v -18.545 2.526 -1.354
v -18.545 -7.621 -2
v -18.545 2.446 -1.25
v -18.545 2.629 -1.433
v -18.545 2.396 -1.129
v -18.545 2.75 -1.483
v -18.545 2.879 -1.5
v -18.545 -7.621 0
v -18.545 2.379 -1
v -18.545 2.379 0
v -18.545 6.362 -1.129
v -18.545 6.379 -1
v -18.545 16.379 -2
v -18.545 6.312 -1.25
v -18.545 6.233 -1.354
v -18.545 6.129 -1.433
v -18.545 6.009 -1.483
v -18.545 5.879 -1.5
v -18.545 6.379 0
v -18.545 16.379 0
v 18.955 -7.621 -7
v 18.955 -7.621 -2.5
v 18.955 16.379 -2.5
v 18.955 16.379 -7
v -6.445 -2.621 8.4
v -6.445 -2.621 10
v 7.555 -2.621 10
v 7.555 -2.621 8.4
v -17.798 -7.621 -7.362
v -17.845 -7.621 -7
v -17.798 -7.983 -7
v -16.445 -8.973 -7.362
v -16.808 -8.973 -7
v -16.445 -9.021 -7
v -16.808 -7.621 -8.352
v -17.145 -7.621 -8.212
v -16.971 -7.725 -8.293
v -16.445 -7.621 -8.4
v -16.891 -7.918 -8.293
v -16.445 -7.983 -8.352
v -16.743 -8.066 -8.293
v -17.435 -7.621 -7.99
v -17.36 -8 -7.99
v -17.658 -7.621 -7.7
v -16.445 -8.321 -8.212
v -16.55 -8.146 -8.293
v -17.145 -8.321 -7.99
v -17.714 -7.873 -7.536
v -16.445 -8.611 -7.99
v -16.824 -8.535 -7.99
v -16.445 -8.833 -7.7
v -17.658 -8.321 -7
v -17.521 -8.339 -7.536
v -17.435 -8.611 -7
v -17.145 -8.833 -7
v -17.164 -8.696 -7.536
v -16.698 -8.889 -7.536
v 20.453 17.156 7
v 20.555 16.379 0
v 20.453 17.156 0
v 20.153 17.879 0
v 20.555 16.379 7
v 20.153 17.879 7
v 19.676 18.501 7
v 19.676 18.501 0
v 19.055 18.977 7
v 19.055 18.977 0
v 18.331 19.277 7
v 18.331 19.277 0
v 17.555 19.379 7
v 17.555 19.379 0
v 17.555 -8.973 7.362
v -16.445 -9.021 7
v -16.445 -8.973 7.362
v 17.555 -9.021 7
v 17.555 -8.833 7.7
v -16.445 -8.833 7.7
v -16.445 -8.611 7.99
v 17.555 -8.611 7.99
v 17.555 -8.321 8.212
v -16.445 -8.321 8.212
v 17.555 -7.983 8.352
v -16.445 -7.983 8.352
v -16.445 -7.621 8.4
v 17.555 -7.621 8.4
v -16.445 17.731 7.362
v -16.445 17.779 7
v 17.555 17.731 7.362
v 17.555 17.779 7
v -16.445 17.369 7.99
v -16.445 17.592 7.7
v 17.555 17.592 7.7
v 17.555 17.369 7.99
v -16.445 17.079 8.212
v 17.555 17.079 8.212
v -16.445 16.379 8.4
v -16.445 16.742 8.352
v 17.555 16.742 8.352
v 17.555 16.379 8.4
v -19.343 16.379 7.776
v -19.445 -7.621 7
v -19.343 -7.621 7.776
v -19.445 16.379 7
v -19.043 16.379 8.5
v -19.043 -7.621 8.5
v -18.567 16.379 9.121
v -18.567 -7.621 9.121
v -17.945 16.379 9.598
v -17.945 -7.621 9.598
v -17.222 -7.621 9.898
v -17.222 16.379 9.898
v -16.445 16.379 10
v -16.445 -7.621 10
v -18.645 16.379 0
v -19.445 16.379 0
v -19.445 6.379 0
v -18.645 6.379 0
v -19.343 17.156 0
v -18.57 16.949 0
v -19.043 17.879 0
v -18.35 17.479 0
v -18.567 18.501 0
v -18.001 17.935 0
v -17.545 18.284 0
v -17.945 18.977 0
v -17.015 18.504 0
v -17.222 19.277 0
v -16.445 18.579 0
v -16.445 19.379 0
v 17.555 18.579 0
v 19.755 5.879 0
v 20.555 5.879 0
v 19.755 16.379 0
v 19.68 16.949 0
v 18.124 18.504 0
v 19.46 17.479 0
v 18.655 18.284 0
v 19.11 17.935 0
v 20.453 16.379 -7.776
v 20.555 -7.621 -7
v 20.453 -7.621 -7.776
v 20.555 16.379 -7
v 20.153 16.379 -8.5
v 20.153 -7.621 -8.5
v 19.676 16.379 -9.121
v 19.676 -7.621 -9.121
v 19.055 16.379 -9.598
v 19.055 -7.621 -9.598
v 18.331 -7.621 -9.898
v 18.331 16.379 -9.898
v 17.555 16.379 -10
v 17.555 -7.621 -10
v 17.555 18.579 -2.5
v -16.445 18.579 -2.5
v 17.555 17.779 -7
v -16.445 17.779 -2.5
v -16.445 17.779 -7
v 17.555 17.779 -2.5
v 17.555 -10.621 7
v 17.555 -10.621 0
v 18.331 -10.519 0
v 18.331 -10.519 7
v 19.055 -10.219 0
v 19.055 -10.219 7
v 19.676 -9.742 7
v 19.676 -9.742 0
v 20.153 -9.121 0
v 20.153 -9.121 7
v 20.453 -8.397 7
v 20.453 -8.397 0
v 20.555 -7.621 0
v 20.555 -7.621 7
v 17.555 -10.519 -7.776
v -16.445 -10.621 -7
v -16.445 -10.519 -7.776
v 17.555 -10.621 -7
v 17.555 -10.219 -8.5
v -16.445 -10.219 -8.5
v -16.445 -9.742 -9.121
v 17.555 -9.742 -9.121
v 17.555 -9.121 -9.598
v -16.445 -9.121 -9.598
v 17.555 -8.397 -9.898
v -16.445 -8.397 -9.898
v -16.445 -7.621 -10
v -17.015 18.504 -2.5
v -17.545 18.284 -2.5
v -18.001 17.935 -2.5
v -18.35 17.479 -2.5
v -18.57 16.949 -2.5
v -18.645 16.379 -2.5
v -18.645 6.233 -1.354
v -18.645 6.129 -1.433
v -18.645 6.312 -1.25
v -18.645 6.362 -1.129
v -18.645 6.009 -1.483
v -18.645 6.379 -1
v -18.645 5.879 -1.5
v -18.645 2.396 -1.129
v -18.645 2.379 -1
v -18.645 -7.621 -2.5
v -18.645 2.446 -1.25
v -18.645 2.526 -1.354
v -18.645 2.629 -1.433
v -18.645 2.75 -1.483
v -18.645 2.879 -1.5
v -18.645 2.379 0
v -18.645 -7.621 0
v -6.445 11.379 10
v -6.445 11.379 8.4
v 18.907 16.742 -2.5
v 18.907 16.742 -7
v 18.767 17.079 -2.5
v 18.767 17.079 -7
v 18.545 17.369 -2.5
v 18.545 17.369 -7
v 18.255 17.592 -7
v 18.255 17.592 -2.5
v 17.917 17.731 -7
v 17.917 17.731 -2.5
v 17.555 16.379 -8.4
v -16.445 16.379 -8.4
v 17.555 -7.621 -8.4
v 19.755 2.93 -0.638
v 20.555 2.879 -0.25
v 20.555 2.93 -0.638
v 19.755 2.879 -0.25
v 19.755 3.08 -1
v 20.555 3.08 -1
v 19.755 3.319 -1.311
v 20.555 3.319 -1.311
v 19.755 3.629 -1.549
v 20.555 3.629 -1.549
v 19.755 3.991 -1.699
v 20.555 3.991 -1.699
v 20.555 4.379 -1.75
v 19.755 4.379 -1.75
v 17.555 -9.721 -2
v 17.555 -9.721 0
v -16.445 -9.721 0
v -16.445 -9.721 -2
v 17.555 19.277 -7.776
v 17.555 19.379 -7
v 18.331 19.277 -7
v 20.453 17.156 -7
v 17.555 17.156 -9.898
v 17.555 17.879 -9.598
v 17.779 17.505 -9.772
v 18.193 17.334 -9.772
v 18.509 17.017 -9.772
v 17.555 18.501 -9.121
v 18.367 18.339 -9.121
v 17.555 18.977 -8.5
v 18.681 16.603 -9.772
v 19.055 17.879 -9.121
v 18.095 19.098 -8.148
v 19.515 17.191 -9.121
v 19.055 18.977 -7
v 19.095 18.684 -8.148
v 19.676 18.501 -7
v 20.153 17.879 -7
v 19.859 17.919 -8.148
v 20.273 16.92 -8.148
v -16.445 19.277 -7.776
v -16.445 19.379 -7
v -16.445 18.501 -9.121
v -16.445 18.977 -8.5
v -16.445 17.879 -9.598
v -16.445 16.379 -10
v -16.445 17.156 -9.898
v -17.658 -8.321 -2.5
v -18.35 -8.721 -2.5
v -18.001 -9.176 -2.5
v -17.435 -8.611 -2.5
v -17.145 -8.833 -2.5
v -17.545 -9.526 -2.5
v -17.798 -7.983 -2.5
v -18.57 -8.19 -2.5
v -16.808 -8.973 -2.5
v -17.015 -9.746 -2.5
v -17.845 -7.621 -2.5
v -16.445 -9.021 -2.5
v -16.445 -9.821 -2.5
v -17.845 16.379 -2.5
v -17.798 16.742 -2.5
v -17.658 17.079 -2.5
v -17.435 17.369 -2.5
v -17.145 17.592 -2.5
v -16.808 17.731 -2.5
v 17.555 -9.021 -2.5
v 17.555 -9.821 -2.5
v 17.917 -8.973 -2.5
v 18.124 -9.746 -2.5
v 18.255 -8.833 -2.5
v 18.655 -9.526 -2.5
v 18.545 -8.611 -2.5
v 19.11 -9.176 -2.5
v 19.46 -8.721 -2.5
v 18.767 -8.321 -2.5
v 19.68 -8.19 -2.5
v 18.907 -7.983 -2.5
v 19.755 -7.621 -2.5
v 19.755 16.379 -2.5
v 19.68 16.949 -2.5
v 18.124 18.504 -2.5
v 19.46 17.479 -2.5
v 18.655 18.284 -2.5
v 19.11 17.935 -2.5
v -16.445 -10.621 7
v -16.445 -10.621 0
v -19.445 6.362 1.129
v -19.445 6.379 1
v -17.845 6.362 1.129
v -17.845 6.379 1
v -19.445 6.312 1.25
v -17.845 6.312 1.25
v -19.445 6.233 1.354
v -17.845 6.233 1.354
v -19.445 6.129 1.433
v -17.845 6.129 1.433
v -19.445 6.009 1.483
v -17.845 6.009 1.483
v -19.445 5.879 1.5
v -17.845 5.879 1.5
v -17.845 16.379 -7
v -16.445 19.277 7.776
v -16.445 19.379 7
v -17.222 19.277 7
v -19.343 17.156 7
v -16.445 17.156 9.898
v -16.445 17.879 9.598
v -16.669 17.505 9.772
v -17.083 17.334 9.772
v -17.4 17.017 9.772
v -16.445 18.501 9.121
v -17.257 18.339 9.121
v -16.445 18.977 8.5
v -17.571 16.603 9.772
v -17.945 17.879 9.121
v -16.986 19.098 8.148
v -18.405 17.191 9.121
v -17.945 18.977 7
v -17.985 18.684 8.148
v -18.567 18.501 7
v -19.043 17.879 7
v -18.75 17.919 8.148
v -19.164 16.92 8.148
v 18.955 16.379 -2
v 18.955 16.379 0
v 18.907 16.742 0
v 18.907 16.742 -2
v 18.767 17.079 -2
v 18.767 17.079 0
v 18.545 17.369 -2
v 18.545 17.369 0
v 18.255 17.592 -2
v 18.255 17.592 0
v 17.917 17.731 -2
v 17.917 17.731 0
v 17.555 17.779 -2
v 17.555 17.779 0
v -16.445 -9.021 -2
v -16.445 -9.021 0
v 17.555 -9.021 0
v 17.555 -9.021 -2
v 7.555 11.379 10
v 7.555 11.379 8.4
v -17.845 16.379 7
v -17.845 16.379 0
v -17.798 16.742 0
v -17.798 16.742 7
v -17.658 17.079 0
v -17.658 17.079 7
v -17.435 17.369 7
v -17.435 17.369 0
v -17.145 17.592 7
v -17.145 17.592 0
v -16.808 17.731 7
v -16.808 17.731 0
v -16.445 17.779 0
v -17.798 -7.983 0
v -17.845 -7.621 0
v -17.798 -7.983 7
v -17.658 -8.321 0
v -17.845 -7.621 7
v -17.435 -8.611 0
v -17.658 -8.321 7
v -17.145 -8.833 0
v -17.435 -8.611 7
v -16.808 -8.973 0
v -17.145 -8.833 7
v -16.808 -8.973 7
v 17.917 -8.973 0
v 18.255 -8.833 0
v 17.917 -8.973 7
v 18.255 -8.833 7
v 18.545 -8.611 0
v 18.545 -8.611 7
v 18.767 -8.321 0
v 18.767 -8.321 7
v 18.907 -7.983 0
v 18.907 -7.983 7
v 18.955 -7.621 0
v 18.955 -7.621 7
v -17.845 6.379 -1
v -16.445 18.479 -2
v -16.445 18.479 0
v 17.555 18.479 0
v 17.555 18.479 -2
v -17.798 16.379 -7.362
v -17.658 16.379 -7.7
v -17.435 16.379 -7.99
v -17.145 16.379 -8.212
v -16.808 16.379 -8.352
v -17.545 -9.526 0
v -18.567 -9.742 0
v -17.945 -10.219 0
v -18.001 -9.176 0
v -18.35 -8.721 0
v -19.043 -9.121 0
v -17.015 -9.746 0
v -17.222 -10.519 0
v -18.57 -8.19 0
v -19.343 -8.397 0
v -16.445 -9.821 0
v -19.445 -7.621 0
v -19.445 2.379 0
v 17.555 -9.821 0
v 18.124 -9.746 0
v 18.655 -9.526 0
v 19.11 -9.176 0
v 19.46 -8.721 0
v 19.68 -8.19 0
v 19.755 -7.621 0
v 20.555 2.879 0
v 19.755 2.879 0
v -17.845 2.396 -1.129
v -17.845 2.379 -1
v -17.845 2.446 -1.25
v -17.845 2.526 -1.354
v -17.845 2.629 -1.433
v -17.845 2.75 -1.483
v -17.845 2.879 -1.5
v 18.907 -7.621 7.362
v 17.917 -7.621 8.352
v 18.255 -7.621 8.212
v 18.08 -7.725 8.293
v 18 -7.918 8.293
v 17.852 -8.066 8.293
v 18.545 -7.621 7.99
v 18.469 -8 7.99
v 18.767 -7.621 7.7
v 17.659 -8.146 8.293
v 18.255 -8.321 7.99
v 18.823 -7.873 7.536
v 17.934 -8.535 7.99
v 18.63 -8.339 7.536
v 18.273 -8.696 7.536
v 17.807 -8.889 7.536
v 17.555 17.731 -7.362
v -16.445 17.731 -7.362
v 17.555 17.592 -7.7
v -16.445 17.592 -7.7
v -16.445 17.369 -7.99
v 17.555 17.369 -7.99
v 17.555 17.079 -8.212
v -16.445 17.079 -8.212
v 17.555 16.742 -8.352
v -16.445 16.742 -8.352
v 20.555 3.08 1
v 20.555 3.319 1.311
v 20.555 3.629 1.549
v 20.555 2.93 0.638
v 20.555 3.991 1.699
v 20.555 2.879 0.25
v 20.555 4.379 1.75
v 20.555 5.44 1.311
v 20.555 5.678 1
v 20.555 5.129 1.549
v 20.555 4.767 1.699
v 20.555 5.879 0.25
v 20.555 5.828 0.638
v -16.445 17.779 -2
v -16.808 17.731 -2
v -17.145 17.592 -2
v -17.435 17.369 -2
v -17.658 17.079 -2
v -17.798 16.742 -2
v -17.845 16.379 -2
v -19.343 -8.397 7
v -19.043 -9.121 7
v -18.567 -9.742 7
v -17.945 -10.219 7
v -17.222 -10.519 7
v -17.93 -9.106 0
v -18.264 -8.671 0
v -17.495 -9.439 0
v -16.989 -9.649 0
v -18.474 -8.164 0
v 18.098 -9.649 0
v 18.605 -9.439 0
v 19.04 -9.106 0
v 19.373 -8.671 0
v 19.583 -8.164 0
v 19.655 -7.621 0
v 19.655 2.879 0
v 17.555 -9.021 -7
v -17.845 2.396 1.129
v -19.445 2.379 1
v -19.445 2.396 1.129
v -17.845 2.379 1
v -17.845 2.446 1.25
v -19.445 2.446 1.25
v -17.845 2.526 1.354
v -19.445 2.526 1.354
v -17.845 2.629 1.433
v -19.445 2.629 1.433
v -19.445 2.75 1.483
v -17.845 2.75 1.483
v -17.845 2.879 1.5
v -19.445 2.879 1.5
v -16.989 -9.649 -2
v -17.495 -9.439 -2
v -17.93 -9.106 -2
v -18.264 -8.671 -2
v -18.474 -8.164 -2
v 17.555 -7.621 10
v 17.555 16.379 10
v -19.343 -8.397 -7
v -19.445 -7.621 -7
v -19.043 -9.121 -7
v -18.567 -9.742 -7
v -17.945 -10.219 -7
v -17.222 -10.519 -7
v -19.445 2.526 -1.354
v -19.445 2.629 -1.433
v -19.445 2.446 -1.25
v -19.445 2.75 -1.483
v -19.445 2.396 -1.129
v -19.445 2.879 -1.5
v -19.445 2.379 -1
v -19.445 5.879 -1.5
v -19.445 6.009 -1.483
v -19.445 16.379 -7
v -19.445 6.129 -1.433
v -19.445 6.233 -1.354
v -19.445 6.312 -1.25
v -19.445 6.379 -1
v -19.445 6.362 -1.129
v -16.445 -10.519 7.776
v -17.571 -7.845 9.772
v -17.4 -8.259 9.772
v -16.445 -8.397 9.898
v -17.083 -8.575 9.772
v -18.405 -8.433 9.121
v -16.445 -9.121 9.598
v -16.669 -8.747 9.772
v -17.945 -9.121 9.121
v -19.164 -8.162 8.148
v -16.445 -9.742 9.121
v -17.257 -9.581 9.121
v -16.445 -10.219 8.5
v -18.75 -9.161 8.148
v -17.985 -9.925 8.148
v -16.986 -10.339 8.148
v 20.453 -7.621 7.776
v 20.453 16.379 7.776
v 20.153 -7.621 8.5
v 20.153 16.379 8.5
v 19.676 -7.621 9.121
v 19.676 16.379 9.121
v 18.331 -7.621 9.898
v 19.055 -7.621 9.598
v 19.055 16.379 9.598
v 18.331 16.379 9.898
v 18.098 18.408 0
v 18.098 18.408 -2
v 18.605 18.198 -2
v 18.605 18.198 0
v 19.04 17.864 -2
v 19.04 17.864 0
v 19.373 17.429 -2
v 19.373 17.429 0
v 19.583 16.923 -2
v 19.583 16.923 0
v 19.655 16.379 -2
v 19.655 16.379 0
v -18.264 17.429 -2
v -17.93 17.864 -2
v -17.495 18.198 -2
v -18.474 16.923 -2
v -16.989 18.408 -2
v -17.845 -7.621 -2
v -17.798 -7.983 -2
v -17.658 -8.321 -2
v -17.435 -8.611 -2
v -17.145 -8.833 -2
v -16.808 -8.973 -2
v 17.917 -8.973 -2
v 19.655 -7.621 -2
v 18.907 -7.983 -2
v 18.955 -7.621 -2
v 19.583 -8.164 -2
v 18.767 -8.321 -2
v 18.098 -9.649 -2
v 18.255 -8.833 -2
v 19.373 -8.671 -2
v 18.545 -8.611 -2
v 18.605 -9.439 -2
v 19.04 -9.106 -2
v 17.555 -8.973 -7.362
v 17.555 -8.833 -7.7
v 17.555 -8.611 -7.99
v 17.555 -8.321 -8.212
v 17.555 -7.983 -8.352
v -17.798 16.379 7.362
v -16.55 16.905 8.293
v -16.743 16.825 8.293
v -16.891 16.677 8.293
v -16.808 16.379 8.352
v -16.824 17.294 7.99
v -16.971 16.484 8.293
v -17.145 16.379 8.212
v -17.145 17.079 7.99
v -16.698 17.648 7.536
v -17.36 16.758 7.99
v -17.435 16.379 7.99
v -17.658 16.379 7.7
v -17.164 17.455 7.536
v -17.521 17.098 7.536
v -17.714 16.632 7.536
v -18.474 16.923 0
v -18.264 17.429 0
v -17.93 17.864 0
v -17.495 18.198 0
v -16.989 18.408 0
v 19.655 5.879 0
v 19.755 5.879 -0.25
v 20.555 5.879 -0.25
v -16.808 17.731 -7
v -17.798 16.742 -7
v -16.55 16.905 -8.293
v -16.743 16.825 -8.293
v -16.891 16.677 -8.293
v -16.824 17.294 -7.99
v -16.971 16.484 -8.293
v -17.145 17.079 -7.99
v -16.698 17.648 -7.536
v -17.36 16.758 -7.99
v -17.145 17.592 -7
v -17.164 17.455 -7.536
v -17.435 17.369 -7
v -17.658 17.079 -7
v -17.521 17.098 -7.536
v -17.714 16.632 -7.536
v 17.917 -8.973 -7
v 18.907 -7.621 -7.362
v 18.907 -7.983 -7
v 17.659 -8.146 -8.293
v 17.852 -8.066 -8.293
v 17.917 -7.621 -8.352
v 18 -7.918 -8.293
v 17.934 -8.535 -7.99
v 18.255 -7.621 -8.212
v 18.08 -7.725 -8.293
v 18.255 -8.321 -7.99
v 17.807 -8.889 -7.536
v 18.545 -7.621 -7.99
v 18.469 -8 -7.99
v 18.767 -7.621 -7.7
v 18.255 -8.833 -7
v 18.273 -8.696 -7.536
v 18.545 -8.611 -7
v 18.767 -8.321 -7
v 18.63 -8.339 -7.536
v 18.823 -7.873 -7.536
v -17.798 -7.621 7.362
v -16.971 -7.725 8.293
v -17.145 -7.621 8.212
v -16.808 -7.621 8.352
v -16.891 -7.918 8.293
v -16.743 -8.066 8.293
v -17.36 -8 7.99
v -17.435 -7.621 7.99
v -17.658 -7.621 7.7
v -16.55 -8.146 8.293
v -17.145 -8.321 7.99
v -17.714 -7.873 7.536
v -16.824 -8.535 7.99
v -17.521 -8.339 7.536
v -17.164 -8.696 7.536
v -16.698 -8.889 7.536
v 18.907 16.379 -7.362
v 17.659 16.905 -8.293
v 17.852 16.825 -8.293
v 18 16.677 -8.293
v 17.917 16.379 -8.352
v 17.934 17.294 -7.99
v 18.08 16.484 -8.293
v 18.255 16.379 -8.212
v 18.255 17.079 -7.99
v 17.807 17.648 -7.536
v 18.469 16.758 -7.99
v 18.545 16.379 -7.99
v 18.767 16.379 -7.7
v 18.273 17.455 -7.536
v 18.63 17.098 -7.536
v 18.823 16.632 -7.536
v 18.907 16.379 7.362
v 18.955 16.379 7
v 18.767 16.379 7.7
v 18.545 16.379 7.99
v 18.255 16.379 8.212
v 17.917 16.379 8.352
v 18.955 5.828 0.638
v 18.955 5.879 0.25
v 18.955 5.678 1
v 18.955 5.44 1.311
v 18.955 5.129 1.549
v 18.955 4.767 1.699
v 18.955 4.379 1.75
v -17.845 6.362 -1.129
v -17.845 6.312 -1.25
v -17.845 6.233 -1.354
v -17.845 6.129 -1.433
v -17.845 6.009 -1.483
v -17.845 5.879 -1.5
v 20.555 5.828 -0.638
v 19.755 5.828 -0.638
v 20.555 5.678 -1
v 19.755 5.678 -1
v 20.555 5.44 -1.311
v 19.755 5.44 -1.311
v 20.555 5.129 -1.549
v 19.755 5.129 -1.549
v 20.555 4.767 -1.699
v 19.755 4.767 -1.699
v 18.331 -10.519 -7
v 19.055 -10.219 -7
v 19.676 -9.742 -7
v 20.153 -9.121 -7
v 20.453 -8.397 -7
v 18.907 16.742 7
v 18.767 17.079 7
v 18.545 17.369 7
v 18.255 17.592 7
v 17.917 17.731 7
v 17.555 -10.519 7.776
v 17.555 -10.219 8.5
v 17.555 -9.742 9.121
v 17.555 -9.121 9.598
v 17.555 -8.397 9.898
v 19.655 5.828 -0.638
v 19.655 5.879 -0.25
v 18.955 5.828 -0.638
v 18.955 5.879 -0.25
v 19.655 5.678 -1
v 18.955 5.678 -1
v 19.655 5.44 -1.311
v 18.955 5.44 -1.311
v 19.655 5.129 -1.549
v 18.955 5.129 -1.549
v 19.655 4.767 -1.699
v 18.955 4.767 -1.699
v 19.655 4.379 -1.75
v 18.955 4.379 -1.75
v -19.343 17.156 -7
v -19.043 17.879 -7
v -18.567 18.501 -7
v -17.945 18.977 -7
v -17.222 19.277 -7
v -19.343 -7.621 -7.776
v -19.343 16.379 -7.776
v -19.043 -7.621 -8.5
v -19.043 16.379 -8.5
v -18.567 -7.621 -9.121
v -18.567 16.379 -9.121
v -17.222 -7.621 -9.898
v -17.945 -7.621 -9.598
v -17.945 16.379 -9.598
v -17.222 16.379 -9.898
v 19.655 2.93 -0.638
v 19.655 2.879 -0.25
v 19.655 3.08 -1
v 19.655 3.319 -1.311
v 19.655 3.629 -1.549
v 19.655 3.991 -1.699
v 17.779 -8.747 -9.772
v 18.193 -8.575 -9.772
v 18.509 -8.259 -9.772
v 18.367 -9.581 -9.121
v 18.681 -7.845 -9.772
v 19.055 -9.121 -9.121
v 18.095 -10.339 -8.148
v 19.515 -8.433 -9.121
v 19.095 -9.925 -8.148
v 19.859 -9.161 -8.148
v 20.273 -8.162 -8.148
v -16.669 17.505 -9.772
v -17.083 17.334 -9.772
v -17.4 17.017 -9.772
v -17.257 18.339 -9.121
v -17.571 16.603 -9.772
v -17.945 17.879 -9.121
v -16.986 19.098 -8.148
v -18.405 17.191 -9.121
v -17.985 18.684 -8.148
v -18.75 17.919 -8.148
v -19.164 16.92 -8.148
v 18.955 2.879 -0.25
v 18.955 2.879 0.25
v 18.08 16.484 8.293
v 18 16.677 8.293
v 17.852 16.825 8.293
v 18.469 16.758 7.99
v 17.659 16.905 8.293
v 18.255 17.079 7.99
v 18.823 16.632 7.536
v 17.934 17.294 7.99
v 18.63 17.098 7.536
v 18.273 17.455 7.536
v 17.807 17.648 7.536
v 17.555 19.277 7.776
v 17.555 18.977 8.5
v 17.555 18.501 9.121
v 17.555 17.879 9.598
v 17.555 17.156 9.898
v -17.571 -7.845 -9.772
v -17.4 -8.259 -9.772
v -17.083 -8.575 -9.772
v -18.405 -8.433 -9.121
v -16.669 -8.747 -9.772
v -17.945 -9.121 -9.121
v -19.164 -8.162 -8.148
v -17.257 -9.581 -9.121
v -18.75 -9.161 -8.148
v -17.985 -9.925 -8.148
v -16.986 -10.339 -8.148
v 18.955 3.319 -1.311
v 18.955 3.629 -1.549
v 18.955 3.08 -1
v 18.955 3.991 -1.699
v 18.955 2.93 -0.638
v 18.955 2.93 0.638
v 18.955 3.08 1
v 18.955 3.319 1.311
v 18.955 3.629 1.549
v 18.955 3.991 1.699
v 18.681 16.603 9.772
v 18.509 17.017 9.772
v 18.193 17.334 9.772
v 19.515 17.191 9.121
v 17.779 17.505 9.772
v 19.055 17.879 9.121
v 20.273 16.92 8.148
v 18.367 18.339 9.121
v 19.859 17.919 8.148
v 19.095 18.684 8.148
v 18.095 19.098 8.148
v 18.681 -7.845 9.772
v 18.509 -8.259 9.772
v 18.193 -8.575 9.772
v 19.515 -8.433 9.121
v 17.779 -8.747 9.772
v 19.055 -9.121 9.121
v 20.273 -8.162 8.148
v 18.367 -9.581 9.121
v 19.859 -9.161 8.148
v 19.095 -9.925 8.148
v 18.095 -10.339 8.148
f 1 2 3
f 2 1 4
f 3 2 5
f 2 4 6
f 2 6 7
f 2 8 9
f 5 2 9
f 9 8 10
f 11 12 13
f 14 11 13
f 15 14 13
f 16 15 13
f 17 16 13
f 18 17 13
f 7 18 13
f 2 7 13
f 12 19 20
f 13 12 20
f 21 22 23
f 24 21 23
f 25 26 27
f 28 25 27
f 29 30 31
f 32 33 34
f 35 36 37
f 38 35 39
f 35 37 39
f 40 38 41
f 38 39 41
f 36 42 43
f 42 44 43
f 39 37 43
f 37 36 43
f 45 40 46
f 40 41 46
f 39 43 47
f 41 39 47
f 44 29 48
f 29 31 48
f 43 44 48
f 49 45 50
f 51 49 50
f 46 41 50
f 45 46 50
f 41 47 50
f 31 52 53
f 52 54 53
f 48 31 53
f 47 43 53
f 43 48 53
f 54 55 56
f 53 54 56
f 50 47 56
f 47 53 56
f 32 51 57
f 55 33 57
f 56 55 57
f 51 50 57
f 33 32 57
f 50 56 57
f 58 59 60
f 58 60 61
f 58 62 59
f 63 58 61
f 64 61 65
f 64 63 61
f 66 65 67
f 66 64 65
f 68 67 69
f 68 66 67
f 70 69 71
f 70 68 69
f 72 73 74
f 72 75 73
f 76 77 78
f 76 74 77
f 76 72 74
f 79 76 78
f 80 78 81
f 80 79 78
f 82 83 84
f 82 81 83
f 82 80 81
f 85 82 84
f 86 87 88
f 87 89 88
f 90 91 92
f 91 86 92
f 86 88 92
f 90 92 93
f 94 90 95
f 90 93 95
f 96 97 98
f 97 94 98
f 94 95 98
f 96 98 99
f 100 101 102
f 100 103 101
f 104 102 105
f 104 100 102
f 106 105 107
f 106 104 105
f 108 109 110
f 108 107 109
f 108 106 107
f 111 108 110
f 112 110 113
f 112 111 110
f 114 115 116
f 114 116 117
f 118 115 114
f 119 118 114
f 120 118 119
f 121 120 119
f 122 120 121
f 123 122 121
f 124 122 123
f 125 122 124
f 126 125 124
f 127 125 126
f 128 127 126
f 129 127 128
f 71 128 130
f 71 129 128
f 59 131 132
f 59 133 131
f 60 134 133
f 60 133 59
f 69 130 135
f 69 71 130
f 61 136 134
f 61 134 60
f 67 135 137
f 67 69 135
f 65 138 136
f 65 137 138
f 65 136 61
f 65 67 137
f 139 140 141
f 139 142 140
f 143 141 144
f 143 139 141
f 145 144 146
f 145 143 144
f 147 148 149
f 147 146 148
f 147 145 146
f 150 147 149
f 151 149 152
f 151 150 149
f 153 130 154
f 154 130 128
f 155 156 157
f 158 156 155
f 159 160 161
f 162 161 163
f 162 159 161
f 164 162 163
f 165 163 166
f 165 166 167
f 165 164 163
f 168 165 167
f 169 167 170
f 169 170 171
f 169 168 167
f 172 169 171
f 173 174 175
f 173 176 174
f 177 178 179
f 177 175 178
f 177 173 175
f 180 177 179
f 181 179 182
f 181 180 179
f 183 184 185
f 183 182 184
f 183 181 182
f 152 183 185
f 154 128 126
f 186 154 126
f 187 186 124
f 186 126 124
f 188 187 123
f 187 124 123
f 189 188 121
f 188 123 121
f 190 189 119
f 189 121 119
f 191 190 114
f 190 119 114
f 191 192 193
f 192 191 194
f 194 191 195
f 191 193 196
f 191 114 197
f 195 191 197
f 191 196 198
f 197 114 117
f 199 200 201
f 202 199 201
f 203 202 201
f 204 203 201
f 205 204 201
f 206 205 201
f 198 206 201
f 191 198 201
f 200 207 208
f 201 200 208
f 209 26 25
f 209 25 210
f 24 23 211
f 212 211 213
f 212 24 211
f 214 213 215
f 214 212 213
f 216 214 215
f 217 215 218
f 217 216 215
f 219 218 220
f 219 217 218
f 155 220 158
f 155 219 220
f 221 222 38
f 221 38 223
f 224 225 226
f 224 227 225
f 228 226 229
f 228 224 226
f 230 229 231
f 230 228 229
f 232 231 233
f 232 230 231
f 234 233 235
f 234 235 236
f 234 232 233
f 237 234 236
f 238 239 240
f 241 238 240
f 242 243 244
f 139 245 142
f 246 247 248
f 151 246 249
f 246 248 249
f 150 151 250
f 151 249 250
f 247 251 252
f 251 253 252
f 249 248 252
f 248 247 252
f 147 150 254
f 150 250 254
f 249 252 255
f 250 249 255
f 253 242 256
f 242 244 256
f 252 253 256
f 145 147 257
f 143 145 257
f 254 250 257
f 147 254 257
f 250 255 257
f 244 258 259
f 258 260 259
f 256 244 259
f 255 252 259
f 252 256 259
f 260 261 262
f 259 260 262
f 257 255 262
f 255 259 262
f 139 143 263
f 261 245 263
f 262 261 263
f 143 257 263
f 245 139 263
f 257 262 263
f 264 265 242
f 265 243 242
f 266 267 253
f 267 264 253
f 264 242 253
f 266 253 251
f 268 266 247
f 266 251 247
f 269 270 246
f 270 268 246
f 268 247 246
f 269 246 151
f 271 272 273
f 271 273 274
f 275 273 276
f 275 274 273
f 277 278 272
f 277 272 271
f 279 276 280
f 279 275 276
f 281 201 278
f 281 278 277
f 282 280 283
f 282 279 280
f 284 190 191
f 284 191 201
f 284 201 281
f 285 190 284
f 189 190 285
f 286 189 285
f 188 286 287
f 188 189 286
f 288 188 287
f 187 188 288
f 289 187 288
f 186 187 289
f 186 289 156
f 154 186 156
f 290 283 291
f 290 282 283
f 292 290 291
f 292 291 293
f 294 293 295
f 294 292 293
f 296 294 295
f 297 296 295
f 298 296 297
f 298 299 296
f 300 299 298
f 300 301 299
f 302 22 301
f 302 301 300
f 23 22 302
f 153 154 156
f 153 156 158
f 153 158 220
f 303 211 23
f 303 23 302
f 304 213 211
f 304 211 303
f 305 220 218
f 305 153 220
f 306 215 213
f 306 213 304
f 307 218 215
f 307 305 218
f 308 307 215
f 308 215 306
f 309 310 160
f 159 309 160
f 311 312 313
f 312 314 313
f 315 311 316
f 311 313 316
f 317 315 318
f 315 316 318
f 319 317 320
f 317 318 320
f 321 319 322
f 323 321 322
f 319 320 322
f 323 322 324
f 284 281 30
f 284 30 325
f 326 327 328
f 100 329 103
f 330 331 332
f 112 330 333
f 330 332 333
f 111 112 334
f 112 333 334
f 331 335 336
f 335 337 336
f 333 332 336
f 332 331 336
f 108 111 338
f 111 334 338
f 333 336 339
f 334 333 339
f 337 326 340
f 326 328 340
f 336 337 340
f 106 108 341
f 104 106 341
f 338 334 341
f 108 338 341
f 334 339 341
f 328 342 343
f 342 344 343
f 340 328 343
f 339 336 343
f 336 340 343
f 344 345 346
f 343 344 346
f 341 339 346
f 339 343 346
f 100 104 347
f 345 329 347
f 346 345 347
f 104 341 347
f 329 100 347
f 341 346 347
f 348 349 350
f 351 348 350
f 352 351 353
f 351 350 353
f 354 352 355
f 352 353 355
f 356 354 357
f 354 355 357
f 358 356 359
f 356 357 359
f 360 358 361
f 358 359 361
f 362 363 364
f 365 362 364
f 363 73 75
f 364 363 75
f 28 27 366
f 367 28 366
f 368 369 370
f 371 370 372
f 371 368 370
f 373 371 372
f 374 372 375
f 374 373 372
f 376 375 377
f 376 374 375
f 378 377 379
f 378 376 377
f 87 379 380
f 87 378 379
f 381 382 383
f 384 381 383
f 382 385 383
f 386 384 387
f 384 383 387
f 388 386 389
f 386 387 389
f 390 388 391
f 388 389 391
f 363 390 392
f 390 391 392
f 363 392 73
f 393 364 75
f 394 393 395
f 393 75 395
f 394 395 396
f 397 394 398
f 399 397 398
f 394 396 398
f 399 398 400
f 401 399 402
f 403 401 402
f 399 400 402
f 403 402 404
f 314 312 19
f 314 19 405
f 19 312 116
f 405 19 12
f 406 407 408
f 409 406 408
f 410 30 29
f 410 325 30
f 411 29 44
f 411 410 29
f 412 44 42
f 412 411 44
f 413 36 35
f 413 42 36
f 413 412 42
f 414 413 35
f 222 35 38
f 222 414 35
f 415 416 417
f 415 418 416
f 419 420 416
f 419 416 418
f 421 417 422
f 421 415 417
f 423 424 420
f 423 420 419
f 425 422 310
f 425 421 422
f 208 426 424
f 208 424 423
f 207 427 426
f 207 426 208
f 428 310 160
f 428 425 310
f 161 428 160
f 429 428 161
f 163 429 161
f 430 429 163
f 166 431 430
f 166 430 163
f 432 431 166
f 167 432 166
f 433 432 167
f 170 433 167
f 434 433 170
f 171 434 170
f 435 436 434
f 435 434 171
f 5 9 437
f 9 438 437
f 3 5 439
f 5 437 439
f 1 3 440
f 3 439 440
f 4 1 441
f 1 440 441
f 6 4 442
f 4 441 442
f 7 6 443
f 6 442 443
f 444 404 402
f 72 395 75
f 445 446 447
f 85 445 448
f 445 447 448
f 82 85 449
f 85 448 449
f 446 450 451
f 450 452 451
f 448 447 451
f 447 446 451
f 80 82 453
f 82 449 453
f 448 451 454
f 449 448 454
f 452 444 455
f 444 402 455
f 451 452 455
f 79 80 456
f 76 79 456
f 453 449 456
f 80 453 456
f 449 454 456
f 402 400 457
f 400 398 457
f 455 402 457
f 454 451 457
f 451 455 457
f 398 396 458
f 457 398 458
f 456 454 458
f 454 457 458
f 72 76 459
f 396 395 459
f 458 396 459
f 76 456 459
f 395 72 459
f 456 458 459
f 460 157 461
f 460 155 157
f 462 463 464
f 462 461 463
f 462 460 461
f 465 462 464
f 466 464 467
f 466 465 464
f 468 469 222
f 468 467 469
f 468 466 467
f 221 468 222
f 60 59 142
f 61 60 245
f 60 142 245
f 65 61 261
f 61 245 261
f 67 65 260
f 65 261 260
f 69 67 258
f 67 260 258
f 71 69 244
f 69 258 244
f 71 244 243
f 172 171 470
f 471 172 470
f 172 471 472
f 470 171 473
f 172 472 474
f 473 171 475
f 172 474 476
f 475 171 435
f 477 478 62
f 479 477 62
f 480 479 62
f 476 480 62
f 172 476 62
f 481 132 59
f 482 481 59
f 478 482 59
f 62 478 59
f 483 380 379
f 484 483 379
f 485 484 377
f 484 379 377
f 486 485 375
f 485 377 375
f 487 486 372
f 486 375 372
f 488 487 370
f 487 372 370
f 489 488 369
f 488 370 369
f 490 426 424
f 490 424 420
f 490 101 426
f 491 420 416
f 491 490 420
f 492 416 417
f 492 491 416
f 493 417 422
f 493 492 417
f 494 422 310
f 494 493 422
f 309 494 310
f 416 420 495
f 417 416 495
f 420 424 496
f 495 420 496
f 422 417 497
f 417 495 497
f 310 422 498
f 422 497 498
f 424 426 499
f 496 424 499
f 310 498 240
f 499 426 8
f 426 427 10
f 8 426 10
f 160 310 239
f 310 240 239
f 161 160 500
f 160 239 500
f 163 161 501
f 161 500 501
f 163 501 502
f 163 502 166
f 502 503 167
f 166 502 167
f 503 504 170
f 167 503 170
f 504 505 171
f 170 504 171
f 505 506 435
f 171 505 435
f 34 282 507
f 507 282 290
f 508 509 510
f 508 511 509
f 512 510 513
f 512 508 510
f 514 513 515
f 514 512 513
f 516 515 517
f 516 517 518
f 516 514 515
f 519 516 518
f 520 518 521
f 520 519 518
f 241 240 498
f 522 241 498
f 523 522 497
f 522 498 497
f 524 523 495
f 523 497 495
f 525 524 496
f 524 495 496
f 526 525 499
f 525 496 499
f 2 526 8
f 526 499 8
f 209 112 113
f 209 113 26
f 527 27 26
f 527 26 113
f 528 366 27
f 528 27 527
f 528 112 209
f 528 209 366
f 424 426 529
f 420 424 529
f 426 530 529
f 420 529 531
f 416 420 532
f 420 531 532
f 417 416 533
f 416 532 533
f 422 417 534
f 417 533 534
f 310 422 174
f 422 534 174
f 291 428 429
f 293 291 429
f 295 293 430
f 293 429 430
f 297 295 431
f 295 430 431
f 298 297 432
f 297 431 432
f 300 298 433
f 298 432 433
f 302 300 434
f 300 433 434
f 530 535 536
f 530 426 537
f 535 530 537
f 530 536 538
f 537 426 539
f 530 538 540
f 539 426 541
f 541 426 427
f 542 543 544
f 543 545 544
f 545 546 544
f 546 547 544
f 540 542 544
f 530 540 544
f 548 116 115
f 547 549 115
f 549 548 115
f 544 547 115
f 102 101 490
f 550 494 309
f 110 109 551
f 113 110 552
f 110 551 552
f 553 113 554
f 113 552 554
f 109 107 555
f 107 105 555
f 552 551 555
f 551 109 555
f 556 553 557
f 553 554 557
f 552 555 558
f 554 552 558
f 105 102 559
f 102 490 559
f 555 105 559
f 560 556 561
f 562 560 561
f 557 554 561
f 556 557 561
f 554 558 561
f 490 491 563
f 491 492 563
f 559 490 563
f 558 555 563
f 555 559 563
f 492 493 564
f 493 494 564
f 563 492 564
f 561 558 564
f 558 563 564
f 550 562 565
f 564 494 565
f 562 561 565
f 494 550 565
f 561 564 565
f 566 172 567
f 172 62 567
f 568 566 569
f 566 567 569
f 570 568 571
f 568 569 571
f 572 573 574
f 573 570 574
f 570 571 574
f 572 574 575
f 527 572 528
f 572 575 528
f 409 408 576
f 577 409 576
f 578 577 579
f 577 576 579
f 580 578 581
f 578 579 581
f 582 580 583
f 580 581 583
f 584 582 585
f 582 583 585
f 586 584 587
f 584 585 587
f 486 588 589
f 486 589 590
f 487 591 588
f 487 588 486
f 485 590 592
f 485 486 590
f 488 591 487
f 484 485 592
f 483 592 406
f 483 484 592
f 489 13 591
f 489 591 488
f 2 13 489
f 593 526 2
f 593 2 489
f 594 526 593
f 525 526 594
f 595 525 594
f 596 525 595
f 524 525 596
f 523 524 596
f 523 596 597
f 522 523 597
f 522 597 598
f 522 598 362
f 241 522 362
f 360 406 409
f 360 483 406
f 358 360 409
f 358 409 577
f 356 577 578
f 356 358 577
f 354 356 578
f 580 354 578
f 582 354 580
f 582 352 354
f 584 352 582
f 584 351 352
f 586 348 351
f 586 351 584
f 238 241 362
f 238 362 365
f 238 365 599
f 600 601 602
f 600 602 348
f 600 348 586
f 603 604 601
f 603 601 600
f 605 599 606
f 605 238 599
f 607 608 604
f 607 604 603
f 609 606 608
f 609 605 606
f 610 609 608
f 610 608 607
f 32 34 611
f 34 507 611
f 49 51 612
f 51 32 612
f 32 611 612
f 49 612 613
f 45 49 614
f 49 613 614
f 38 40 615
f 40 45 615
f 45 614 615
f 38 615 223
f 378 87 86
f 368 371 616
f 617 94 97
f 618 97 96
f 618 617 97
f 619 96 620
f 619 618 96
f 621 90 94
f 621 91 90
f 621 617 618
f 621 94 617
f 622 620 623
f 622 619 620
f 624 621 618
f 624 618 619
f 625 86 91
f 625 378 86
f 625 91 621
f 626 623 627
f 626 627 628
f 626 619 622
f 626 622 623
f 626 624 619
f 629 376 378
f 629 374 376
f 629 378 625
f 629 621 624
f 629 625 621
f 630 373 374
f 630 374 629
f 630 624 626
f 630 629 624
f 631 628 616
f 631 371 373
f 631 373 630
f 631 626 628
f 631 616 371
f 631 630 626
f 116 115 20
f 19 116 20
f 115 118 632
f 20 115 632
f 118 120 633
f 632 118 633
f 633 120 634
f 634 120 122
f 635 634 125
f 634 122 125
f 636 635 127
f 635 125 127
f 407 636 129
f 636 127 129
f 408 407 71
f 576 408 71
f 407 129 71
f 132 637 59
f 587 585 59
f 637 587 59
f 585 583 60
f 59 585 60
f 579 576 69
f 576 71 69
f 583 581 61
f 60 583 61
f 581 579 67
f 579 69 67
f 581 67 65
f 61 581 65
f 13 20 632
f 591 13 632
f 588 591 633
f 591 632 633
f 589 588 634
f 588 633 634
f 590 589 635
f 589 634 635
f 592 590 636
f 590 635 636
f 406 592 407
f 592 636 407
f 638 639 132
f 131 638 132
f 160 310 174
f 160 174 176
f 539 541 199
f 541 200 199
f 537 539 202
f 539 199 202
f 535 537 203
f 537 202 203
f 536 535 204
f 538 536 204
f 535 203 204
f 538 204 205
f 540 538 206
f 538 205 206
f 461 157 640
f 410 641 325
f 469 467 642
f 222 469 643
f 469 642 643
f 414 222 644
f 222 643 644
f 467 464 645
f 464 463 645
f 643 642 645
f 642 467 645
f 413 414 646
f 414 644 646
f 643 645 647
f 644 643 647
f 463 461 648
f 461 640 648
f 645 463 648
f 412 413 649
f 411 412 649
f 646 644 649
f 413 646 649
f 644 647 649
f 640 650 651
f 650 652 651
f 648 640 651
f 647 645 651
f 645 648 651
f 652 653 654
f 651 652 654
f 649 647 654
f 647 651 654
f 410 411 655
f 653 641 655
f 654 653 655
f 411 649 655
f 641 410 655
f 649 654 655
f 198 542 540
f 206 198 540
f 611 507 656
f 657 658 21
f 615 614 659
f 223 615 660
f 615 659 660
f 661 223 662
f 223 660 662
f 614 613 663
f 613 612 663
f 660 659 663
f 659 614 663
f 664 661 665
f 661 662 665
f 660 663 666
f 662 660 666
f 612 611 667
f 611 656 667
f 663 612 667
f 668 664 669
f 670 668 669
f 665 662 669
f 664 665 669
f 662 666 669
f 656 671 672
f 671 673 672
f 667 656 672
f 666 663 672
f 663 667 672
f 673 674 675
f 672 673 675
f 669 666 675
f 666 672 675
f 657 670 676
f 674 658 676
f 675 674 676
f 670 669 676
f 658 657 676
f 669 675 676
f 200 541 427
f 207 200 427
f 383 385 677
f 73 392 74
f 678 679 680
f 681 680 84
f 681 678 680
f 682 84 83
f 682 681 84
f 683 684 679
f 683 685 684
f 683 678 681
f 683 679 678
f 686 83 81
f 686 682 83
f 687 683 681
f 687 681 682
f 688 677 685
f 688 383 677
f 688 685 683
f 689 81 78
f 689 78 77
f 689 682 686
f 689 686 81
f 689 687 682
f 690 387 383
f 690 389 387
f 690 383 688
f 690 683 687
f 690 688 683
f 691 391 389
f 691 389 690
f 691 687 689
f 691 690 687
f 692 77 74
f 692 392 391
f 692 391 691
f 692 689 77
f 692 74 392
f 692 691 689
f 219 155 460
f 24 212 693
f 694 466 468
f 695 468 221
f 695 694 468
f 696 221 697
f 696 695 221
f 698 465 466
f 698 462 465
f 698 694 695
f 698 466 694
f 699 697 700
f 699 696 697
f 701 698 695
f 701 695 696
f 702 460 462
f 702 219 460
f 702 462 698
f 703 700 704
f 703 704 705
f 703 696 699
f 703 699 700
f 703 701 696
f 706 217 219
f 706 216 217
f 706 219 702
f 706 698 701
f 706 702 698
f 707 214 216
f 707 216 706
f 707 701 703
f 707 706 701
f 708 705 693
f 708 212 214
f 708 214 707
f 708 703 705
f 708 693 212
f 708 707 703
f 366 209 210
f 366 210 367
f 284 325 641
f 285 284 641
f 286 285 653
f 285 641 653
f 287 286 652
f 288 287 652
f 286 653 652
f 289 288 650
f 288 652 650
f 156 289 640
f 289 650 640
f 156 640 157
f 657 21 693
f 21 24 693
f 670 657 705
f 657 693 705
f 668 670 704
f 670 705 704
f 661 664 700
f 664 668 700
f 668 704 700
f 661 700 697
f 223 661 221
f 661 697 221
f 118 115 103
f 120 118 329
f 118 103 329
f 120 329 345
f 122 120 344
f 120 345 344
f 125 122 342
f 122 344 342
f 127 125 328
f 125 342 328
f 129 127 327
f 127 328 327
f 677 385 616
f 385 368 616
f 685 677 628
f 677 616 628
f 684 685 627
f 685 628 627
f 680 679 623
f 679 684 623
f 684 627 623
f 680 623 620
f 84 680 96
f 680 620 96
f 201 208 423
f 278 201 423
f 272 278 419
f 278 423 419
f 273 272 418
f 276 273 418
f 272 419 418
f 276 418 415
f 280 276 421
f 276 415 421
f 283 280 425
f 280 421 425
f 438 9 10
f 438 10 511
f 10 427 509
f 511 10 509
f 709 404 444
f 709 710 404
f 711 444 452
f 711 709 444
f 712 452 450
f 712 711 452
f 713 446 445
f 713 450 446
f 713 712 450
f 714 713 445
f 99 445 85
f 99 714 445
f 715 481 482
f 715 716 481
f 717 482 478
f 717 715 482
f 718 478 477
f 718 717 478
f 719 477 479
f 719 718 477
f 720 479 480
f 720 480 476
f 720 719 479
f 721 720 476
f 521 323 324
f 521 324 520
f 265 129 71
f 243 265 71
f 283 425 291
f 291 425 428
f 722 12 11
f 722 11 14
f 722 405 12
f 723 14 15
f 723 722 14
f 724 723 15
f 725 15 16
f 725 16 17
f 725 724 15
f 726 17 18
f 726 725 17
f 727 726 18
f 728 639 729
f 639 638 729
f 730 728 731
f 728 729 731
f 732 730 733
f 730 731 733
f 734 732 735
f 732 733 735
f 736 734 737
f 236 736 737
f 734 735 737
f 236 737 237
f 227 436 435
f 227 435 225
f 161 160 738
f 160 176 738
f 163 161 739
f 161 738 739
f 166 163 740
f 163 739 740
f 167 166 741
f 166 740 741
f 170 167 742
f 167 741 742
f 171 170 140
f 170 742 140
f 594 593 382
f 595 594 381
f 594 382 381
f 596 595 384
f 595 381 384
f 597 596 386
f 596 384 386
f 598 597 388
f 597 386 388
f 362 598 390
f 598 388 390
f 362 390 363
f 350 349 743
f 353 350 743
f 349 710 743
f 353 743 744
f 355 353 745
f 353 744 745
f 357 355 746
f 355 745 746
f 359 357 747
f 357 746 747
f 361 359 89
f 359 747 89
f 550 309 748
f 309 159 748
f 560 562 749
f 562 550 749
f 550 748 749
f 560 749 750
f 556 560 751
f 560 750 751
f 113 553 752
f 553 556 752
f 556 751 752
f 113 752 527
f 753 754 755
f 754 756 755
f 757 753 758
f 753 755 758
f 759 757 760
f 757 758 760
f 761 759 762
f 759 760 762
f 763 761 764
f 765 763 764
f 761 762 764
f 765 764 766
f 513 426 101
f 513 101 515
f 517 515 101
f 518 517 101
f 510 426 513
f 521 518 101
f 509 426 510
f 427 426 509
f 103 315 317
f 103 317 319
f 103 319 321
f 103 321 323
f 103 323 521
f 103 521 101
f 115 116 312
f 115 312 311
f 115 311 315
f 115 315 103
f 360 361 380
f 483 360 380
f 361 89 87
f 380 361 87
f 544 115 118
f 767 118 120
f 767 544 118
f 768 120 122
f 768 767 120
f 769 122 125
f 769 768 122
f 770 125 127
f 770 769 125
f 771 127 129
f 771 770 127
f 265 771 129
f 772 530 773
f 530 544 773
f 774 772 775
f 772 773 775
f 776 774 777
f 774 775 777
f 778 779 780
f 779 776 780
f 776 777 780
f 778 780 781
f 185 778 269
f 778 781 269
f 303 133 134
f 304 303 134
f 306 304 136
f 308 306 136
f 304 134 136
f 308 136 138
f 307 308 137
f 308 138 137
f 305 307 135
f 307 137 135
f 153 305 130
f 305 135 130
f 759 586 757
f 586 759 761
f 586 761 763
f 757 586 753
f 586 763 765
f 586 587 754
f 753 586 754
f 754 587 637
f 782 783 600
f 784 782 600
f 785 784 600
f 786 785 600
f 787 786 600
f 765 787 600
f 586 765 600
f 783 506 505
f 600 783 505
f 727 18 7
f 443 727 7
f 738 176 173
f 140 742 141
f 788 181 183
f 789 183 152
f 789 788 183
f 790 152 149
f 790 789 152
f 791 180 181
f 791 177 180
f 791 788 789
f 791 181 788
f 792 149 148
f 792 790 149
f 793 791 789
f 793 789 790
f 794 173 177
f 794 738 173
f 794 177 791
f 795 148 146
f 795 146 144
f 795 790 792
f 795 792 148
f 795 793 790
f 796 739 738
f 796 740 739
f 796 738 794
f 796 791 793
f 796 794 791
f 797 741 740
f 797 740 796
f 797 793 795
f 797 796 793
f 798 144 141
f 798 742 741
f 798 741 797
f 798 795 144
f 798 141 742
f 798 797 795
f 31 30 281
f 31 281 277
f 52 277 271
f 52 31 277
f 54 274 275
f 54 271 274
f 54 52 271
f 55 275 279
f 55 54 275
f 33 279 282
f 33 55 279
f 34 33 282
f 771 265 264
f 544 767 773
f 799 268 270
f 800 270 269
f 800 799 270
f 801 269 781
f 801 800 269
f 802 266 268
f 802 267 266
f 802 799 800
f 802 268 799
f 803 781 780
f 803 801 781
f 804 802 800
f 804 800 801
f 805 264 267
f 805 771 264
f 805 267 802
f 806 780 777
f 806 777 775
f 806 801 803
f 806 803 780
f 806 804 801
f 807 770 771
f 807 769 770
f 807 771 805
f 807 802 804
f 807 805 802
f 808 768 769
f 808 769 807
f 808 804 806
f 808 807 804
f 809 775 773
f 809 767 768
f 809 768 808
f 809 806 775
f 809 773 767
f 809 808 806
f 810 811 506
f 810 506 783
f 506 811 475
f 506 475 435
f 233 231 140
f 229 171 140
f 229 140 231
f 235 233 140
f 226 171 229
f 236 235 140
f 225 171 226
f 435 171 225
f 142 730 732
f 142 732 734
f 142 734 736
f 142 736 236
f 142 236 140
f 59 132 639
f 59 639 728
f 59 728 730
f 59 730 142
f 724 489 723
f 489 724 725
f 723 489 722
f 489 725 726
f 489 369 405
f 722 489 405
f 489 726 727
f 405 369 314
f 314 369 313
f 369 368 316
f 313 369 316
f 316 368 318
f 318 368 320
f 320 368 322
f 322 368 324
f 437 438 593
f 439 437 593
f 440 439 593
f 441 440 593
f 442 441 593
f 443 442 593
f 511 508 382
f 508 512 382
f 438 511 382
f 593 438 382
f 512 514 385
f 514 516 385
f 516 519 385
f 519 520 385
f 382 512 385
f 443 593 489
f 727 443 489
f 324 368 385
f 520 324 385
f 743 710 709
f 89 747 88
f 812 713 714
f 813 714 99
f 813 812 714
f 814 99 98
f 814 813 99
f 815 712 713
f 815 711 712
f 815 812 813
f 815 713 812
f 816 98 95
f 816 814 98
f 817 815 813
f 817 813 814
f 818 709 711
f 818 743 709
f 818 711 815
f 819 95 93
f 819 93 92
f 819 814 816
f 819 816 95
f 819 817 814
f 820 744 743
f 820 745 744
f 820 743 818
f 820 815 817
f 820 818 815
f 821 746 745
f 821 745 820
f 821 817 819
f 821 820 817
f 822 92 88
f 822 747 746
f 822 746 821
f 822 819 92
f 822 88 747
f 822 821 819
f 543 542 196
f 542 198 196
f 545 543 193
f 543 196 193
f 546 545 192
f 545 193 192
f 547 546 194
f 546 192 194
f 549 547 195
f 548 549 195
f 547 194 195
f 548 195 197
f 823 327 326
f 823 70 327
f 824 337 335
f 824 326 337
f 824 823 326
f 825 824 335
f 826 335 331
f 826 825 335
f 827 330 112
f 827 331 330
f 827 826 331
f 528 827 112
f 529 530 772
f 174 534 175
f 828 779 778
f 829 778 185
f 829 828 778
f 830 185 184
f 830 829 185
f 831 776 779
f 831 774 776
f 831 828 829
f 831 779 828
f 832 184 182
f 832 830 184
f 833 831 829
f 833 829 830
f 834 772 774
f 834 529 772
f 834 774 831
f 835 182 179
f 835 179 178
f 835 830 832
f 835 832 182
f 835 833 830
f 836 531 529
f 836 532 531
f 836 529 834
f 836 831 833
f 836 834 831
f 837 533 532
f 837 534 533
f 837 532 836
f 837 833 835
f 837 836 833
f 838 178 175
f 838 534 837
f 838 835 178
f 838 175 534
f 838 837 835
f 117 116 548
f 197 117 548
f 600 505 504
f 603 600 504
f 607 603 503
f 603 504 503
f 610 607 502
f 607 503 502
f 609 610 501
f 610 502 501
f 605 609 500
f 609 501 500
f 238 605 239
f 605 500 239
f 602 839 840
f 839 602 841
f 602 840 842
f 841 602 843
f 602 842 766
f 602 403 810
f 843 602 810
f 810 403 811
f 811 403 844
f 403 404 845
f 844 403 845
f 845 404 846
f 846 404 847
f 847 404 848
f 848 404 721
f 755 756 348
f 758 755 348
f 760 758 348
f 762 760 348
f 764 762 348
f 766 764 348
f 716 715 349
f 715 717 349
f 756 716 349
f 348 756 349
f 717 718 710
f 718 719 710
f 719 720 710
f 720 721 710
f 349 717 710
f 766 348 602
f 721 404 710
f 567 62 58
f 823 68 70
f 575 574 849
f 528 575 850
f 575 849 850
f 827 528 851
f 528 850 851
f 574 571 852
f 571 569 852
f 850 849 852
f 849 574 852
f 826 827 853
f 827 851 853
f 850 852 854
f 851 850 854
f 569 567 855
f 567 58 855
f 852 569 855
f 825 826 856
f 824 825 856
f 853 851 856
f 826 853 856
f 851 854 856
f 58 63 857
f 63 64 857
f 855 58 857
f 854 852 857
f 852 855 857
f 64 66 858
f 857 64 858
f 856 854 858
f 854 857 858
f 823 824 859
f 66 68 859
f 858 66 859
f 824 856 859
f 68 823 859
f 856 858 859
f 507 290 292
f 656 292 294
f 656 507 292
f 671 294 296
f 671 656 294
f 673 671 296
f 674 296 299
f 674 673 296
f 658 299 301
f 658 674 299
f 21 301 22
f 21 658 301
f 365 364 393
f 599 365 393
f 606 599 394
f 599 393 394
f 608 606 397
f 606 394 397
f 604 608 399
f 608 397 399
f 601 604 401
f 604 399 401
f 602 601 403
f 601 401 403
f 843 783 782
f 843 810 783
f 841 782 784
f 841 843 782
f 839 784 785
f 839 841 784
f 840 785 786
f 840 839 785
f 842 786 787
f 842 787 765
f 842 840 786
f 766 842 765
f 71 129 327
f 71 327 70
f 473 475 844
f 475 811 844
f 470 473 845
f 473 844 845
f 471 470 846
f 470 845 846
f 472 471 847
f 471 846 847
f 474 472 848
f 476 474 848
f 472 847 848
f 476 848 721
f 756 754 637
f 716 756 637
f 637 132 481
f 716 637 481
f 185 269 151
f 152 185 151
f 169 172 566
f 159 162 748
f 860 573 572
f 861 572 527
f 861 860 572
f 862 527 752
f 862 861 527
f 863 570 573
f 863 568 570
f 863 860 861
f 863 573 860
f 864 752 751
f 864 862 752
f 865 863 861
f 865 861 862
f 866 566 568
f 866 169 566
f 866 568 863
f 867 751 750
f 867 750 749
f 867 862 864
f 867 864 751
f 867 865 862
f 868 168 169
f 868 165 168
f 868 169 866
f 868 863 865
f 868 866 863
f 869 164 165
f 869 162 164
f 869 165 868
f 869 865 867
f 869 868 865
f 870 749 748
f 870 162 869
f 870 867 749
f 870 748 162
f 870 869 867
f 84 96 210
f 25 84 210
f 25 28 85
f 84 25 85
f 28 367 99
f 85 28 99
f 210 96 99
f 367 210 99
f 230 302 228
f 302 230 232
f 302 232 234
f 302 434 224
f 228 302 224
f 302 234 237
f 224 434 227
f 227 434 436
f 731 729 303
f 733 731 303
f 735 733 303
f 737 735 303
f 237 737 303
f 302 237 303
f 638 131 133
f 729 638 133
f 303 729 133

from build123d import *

# Parameters (mm, degrees)
F0_W      = 40
F0_H      = 30
F1_DEPTH  = 10
F2_DEPTH  = 10
F3_R      = 3
F3_2_R    = 3
F4_T      = -1.6
F5_T      = -1.6
F6_W      = 14
F6_H      = 14
F7_DEPTH  = 3
F9_DEPTH  = 2.5
F11_DEPTH = 2
F12_W     = 4
F12_H     = 1.5
F13_DEPTH = 5
F14_R     = 0.5
F14_2_R   = 0.5
F15_W     = 3
F15_H     = 1.75
F16_DEPTH = 5
F17_R     = 1.49999
F17_2_R   = 1.49999


# Not quite as in the source:
# - a fillet or chamfer is up to 0.001 mm smaller than in the source, because OpenCascade refuses the exact size
# - a feature names something its author has since deleted; it is built from what else it names


with BuildPart() as f1:
    # F0 (on Top) → F1 (new body)
    with BuildSketch(Plane.XY):
        with Locations((0.5547776818, 4.3791863923)):
            Rectangle(F0_W, F0_H)
    extrude(amount=F1_DEPTH)


with BuildPart() as f2:
    # F2 (new): a face of the model
    f2_faces = [f1.part.faces().sort_by_distance(p)[0] for p in [
        (0.5547776818, 4.3791863923, 0),
    ]]
    extrude(f2_faces, amount=F2_DEPTH)

    # F3
    f3_edges = [f2.edges().sort_by_distance(p)[0] for p in [
        (-19.445222, -10.620814, -5),
        (20.554778, -10.620814, -5),
        (20.554778, 19.379186, -5),
        (-19.445222, 19.379186, -5),
        (0.554778, 19.379186, -10),
        (-19.445222, 4.379186, -10),
        (0.554778, -10.620814, -10),
        (20.554778, 4.379186, -10),
    ]]
    fillet(f3_edges, radius=F3_R)

    # F4
    f4_openings = [f2.faces().sort_by_distance(p)[0] for p in [
        (0.554778, 4.379186, 0),
    ]]
    offset(amount=F4_T, openings=f4_openings)

    # F8 (on face) → F9 (cut)
    with BuildSketch(Plane.XY):
        with BuildLine():
            Line((19.7547776818, -7.6208136077), (19.7547776818, 16.3791863923))
            ThreePointArc((19.7547776818, 16.3791863923), (19.1104126004, 17.9348213109), (17.5547776818, 18.5791863923))
            Line((17.5547776818, 18.5791863923), (-16.4452223182, 18.5791863923))
            ThreePointArc((-16.4452223182, 18.5791863923), (-18.0008572368, 17.9348213109), (-18.6452223182, 16.3791863923))
            Line((-18.6452223182, 16.3791863923), (-18.6452223182, -7.6208136077))
            ThreePointArc((-18.6452223182, -7.6208136077), (-18.0008572368, -9.1764485263), (-16.4452223182, -9.8208136077))
            Line((-16.4452223182, -9.8208136077), (17.5547776818, -9.8208136077))
            ThreePointArc((17.5547776818, -9.8208136077), (19.1104126004, -9.1764485263), (19.7547776818, -7.6208136077))
        make_face()
        with BuildLine():
            ThreePointArc((17.5547776818, 17.7791863923), (18.5447271755, 17.369135886), (18.9547776818, 16.3791863923))
            Line((18.9547776818, 16.3791863923), (18.9547776818, -7.6208136077))
            ThreePointArc((18.9547776818, -7.6208136077), (18.5447271755, -8.6107631014), (17.5547776818, -9.0208136077))
            Line((17.5547776818, -9.0208136077), (-16.4452223182, -9.0208136077))
            ThreePointArc((-16.4452223182, -9.0208136077), (-17.4351718118, -8.6107631014), (-17.8452223182, -7.6208136077))
            Line((-17.8452223182, -7.6208136077), (-17.8452223182, 16.3791863923))
            ThreePointArc((-17.8452223182, 16.3791863923), (-17.4351718118, 17.369135886), (-16.4452223182, 17.7791863923))
            Line((-16.4452223182, 17.7791863923), (17.5547776818, 17.7791863923))
        make_face(mode=Mode.SUBTRACT)
    extrude(amount=-F9_DEPTH, mode=Mode.SUBTRACT)


with BuildPart() as f1_1:
    add(f1.part)

    # F3#2
    f3_2_edges = [f1_1.edges().sort_by_distance(p)[0] for p in [
        (-19.445222, -10.620814, 5),
        (20.554778, -10.620814, 5),
        (20.554778, 19.379186, 5),
        (-19.445222, 19.379186, 5),
        (20.554778, 4.379186, 10),
        (0.554778, 19.379186, 10),
        (-19.445222, 4.379186, 10),
        (0.554778, -10.620814, 10),
    ]]
    fillet(f3_2_edges, radius=F3_2_R)

    # F5
    f5_openings = [f1_1.faces().sort_by_distance(p)[0] for p in [
        (0.554778, 4.379186, 0),
    ]]
    offset(amount=F5_T, openings=f5_openings)

    # F6 (on face) → F7 (cut)
    with BuildSketch(Plane.XY.offset(10)):
        with Locations((0.5547776818, 4.3791863923)):
            Rectangle(F6_W, F6_H)
    extrude(amount=-F7_DEPTH, mode=Mode.SUBTRACT)

    # F10 (on face) → F11 (join)
    with BuildSketch(Plane(origin=(0, 0, 0), x_dir=(1, 0, 0), z_dir=(0, 0, -1))):
        with BuildLine():
            Line((19.6547776818, -16.3791863923), (19.6547776818, 7.6208136077))
            ThreePointArc((19.6547776818, 7.6208136077), (19.0397019223, 9.1057378482), (17.5547776818, 9.7208136077))
            Line((17.5547776818, 9.7208136077), (-16.4452223182, 9.7208136077))
            ThreePointArc((-16.4452223182, 9.7208136077), (-17.9301465587, 9.1057378482), (-18.5452223182, 7.6208136077))
            Line((-18.5452223182, 7.6208136077), (-18.5452223182, -16.3791863923))
            ThreePointArc((-18.5452223182, -16.3791863923), (-17.9301465587, -17.8641106328), (-16.4452223182, -18.4791863923))
            Line((-16.4452223182, -18.4791863923), (17.5547776818, -18.4791863923))
            ThreePointArc((17.5547776818, -18.4791863923), (19.0397019223, -17.8641106328), (19.6547776818, -16.3791863923))
        make_face()
        with BuildLine():
            ThreePointArc((17.5547776818, 9.0208136077), (18.5447271755, 8.6107631014), (18.9547776818, 7.6208136077))
            Line((18.9547776818, 7.6208136077), (18.9547776818, -16.3791863923))
            ThreePointArc((18.9547776818, -16.3791863923), (18.5447271755, -17.369135886), (17.5547776818, -17.7791863923))
            Line((17.5547776818, -17.7791863923), (-16.4452223182, -17.7791863923))
            ThreePointArc((-16.4452223182, -17.7791863923), (-17.4351718118, -17.369135886), (-17.8452223182, -16.3791863923))
            Line((-17.8452223182, -16.3791863923), (-17.8452223182, 7.6208136077))
            ThreePointArc((-17.8452223182, 7.6208136077), (-17.4351718118, 8.6107631014), (-16.4452223182, 9.0208136077))
            Line((-16.4452223182, 9.0208136077), (17.5547776818, 9.0208136077))
        make_face(mode=Mode.SUBTRACT)
    extrude(amount=F11_DEPTH)


with BuildPart() as f13_tool:
    # F12 (on face) → F13 (new body)
    with BuildSketch(Plane(origin=(-19.4452223182, 0, 0), x_dir=(0, -1, 0), z_dir=(-1, 0, 0))):
        with Locations((-4.3791863923, -0.75)):
            Rectangle(F12_W, F12_H)
        with Locations((-4.3791863923, 0.75)):
            Rectangle(F12_W, F12_H)
    extrude(amount=-F13_DEPTH)


with BuildPart() as f1_2:
    add(f1_1.part)

    # F13: cut by f13_tool
    add(f13_tool.part, mode=Mode.SUBTRACT)

    # F14#2
    f14_2_edges = [f1_2.edges().sort_by_distance(p)[0] for p in [
        (-18.195222, 6.379186, -1.5),
        (-18.195222, 2.379186, -1.5),
        (-18.645222, 6.379186, 1.5),
        (-18.645222, 2.379186, 1.5),
    ]]
    fillet(f14_2_edges, radius=F14_2_R)


with BuildPart() as f2_1:
    add(f2.part)

    # F13: cut by f13_tool
    add(f13_tool.part, mode=Mode.SUBTRACT)

    # F14
    f14_edges = [f2_1.edges().sort_by_distance(p)[0] for p in [
        (-19.045222, 6.379186, -1.5),
        (-19.045222, 2.379186, -1.5),
    ]]
    fillet(f14_edges, radius=F14_R)


with BuildPart() as f16_tool:
    # F15 (on face) → F16 (new body)
    with BuildSketch(Plane.YZ.offset(20.5547776818)):
        with Locations((4.3791863923, 0.875)):
            Rectangle(F15_W, F15_H)
        with Locations((4.3791863923, -0.875)):
            Rectangle(F15_W, F15_H)
    extrude(amount=-F16_DEPTH)


with BuildPart() as f1_3:
    add(f1_2.part)

    # F16: cut by f16_tool
    add(f16_tool.part, mode=Mode.SUBTRACT)

    # F17 (radius 1.5 in the source; OpenCascade refuses exactly that, so slightly less here)
    f17_edges = [f1_3.edges().sort_by_distance(p)[0] for p in [
        (19.304778, 2.879186, -1.75),
        (19.304778, 5.879186, -1.75),
        (19.754778, 2.879186, 1.75),
        (19.754778, 5.879186, 1.75),
    ]]
    fillet(f17_edges, radius=F17_R)


with BuildPart() as f2_2:
    add(f2_1.part)

    # F16: cut by f16_tool
    add(f16_tool.part, mode=Mode.SUBTRACT)

    # F17#2 (radius 1.5 in the source; OpenCascade refuses exactly that, so slightly less here)
    f17_2_edges = [f2_2.edges().sort_by_distance(p)[0] for p in [
        (20.154778, 2.879186, -1.75),
        (20.154778, 5.879186, -1.75),
    ]]
    fillet(f17_2_edges, radius=F17_2_R)


solid = Compound([f1_3.part, f2_2.part])
